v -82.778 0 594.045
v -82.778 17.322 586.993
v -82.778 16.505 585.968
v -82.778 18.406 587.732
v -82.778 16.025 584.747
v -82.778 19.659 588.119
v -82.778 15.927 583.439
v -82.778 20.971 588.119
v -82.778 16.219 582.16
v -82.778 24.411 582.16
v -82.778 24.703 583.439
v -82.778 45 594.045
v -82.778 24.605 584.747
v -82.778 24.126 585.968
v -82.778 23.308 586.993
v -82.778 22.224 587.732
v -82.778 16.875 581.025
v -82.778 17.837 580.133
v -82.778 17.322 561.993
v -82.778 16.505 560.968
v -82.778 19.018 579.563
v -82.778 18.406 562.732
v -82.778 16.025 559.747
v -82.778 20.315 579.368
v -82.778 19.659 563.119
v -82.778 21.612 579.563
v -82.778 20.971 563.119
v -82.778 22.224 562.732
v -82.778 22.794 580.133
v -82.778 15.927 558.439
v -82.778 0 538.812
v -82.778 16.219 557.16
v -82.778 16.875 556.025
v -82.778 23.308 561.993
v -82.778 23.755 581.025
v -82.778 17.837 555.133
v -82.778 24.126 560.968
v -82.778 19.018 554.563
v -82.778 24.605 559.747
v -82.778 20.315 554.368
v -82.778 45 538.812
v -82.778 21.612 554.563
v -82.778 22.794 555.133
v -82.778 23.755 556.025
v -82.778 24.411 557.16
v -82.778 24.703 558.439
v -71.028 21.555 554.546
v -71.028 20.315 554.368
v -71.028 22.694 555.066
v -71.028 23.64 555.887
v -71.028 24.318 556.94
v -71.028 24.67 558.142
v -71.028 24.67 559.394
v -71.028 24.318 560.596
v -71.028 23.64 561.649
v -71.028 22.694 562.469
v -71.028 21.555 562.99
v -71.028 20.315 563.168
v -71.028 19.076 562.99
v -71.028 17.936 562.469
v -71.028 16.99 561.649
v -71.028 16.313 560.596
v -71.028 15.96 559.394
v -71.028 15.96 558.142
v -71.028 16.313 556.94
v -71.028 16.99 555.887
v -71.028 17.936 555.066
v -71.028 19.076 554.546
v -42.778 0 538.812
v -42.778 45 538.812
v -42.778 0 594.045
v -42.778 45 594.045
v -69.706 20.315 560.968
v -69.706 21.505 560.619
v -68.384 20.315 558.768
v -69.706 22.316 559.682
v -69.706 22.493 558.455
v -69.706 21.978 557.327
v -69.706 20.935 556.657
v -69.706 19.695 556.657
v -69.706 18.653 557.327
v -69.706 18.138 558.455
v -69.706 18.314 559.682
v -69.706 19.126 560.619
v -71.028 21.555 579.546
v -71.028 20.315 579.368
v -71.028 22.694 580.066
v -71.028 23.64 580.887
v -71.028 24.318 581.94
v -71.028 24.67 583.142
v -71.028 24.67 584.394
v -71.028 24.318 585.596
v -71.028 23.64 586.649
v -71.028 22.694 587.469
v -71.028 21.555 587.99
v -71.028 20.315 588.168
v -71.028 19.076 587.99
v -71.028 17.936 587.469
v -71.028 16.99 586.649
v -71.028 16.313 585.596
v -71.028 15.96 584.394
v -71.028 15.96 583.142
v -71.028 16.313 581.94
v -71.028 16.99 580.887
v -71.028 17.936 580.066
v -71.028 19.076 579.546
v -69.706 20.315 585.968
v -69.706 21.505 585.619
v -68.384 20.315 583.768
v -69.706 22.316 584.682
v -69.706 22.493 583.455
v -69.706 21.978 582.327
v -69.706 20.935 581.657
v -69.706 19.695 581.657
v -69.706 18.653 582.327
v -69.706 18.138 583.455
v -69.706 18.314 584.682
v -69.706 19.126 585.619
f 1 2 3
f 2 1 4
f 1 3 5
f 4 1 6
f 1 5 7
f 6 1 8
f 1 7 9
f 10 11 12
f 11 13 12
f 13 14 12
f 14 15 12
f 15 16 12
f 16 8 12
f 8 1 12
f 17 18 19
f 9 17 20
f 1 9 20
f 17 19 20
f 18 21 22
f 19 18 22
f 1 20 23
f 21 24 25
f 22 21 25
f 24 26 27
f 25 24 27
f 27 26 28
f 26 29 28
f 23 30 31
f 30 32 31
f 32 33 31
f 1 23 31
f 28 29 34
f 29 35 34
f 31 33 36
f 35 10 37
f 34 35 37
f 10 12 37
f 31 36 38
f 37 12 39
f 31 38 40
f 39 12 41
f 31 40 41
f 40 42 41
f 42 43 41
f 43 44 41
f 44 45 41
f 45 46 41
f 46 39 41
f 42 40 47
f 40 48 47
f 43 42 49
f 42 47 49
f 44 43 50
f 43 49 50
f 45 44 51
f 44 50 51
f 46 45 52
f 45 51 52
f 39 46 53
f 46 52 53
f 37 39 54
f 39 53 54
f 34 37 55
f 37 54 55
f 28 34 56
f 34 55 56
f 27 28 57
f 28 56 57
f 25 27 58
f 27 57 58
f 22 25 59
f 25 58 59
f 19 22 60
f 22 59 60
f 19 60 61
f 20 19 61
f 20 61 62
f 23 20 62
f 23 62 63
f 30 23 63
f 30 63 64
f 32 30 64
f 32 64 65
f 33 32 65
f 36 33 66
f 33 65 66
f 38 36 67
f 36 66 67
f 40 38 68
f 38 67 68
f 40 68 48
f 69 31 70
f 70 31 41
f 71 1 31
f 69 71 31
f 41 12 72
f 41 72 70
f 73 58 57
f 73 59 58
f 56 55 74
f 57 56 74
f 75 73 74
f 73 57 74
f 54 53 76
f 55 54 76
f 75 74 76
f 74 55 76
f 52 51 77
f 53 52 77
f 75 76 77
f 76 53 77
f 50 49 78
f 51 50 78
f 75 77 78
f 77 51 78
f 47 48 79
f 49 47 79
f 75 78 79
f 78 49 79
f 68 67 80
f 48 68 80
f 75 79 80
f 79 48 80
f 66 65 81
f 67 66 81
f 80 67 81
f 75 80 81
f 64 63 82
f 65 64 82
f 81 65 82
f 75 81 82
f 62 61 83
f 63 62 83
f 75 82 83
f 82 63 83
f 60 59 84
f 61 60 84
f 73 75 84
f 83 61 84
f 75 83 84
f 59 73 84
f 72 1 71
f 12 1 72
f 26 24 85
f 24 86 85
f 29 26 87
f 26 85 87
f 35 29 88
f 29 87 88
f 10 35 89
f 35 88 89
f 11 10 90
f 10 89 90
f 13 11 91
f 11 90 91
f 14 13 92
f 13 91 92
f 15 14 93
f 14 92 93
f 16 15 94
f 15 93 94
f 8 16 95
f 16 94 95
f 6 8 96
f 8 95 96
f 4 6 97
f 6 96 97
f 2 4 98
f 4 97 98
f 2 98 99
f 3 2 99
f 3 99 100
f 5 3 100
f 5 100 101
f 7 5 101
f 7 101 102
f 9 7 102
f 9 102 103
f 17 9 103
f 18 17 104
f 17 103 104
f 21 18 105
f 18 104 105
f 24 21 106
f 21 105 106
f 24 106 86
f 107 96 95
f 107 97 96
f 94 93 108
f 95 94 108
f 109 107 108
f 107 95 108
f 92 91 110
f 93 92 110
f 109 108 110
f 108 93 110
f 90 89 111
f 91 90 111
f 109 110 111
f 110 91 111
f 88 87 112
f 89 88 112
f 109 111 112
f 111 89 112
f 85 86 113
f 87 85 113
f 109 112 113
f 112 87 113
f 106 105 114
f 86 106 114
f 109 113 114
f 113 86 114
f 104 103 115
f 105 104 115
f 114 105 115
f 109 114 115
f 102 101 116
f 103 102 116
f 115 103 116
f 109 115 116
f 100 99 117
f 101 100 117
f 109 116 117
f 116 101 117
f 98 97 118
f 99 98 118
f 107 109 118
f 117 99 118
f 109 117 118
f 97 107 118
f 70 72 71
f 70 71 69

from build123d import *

# Parameters (mm, degrees)
SKETCH1_W                   = 55.233155238
SKETCH1_H                   = 45
BOSS_EXTRUDE1_DEPTH         = 40
M10X1_25_TAPPED_HOLE1_D     = 8.8
M10X1_25_TAPPED_HOLE1_DEPTH = 11.75
M10X1_25_TAPPED_HOLE1_TIP   = 2.643786724


with BuildPart() as part:
    # Sketch1 → Boss-Extrude1 (new body)
    with BuildSketch(Plane(origin=(-82.778181514, 0, 0), x_dir=(0, 0, -1), z_dir=(1, 0, 0))):
        with Locations((-566.428701217, 22.5)):
            Rectangle(SKETCH1_W, SKETCH1_H)
    extrude(amount=BOSS_EXTRUDE1_DEPTH)

    # M10x1.25 Tapped Hole1
    with Locations(Plane.ZY.offset(82.778181514)):
        with Locations((583.767961031, 20.315155656), (558.767961031, 20.315155656)):
            Hole(M10X1_25_TAPPED_HOLE1_D / 2, depth=M10X1_25_TAPPED_HOLE1_DEPTH)
            with Locations((0, 0, -(M10X1_25_TAPPED_HOLE1_DEPTH + M10X1_25_TAPPED_HOLE1_TIP / 2))):  # 118° drill point
                Cone(0, M10X1_25_TAPPED_HOLE1_D / 2, M10X1_25_TAPPED_HOLE1_TIP, mode=Mode.SUBTRACT)


solid = part.part
